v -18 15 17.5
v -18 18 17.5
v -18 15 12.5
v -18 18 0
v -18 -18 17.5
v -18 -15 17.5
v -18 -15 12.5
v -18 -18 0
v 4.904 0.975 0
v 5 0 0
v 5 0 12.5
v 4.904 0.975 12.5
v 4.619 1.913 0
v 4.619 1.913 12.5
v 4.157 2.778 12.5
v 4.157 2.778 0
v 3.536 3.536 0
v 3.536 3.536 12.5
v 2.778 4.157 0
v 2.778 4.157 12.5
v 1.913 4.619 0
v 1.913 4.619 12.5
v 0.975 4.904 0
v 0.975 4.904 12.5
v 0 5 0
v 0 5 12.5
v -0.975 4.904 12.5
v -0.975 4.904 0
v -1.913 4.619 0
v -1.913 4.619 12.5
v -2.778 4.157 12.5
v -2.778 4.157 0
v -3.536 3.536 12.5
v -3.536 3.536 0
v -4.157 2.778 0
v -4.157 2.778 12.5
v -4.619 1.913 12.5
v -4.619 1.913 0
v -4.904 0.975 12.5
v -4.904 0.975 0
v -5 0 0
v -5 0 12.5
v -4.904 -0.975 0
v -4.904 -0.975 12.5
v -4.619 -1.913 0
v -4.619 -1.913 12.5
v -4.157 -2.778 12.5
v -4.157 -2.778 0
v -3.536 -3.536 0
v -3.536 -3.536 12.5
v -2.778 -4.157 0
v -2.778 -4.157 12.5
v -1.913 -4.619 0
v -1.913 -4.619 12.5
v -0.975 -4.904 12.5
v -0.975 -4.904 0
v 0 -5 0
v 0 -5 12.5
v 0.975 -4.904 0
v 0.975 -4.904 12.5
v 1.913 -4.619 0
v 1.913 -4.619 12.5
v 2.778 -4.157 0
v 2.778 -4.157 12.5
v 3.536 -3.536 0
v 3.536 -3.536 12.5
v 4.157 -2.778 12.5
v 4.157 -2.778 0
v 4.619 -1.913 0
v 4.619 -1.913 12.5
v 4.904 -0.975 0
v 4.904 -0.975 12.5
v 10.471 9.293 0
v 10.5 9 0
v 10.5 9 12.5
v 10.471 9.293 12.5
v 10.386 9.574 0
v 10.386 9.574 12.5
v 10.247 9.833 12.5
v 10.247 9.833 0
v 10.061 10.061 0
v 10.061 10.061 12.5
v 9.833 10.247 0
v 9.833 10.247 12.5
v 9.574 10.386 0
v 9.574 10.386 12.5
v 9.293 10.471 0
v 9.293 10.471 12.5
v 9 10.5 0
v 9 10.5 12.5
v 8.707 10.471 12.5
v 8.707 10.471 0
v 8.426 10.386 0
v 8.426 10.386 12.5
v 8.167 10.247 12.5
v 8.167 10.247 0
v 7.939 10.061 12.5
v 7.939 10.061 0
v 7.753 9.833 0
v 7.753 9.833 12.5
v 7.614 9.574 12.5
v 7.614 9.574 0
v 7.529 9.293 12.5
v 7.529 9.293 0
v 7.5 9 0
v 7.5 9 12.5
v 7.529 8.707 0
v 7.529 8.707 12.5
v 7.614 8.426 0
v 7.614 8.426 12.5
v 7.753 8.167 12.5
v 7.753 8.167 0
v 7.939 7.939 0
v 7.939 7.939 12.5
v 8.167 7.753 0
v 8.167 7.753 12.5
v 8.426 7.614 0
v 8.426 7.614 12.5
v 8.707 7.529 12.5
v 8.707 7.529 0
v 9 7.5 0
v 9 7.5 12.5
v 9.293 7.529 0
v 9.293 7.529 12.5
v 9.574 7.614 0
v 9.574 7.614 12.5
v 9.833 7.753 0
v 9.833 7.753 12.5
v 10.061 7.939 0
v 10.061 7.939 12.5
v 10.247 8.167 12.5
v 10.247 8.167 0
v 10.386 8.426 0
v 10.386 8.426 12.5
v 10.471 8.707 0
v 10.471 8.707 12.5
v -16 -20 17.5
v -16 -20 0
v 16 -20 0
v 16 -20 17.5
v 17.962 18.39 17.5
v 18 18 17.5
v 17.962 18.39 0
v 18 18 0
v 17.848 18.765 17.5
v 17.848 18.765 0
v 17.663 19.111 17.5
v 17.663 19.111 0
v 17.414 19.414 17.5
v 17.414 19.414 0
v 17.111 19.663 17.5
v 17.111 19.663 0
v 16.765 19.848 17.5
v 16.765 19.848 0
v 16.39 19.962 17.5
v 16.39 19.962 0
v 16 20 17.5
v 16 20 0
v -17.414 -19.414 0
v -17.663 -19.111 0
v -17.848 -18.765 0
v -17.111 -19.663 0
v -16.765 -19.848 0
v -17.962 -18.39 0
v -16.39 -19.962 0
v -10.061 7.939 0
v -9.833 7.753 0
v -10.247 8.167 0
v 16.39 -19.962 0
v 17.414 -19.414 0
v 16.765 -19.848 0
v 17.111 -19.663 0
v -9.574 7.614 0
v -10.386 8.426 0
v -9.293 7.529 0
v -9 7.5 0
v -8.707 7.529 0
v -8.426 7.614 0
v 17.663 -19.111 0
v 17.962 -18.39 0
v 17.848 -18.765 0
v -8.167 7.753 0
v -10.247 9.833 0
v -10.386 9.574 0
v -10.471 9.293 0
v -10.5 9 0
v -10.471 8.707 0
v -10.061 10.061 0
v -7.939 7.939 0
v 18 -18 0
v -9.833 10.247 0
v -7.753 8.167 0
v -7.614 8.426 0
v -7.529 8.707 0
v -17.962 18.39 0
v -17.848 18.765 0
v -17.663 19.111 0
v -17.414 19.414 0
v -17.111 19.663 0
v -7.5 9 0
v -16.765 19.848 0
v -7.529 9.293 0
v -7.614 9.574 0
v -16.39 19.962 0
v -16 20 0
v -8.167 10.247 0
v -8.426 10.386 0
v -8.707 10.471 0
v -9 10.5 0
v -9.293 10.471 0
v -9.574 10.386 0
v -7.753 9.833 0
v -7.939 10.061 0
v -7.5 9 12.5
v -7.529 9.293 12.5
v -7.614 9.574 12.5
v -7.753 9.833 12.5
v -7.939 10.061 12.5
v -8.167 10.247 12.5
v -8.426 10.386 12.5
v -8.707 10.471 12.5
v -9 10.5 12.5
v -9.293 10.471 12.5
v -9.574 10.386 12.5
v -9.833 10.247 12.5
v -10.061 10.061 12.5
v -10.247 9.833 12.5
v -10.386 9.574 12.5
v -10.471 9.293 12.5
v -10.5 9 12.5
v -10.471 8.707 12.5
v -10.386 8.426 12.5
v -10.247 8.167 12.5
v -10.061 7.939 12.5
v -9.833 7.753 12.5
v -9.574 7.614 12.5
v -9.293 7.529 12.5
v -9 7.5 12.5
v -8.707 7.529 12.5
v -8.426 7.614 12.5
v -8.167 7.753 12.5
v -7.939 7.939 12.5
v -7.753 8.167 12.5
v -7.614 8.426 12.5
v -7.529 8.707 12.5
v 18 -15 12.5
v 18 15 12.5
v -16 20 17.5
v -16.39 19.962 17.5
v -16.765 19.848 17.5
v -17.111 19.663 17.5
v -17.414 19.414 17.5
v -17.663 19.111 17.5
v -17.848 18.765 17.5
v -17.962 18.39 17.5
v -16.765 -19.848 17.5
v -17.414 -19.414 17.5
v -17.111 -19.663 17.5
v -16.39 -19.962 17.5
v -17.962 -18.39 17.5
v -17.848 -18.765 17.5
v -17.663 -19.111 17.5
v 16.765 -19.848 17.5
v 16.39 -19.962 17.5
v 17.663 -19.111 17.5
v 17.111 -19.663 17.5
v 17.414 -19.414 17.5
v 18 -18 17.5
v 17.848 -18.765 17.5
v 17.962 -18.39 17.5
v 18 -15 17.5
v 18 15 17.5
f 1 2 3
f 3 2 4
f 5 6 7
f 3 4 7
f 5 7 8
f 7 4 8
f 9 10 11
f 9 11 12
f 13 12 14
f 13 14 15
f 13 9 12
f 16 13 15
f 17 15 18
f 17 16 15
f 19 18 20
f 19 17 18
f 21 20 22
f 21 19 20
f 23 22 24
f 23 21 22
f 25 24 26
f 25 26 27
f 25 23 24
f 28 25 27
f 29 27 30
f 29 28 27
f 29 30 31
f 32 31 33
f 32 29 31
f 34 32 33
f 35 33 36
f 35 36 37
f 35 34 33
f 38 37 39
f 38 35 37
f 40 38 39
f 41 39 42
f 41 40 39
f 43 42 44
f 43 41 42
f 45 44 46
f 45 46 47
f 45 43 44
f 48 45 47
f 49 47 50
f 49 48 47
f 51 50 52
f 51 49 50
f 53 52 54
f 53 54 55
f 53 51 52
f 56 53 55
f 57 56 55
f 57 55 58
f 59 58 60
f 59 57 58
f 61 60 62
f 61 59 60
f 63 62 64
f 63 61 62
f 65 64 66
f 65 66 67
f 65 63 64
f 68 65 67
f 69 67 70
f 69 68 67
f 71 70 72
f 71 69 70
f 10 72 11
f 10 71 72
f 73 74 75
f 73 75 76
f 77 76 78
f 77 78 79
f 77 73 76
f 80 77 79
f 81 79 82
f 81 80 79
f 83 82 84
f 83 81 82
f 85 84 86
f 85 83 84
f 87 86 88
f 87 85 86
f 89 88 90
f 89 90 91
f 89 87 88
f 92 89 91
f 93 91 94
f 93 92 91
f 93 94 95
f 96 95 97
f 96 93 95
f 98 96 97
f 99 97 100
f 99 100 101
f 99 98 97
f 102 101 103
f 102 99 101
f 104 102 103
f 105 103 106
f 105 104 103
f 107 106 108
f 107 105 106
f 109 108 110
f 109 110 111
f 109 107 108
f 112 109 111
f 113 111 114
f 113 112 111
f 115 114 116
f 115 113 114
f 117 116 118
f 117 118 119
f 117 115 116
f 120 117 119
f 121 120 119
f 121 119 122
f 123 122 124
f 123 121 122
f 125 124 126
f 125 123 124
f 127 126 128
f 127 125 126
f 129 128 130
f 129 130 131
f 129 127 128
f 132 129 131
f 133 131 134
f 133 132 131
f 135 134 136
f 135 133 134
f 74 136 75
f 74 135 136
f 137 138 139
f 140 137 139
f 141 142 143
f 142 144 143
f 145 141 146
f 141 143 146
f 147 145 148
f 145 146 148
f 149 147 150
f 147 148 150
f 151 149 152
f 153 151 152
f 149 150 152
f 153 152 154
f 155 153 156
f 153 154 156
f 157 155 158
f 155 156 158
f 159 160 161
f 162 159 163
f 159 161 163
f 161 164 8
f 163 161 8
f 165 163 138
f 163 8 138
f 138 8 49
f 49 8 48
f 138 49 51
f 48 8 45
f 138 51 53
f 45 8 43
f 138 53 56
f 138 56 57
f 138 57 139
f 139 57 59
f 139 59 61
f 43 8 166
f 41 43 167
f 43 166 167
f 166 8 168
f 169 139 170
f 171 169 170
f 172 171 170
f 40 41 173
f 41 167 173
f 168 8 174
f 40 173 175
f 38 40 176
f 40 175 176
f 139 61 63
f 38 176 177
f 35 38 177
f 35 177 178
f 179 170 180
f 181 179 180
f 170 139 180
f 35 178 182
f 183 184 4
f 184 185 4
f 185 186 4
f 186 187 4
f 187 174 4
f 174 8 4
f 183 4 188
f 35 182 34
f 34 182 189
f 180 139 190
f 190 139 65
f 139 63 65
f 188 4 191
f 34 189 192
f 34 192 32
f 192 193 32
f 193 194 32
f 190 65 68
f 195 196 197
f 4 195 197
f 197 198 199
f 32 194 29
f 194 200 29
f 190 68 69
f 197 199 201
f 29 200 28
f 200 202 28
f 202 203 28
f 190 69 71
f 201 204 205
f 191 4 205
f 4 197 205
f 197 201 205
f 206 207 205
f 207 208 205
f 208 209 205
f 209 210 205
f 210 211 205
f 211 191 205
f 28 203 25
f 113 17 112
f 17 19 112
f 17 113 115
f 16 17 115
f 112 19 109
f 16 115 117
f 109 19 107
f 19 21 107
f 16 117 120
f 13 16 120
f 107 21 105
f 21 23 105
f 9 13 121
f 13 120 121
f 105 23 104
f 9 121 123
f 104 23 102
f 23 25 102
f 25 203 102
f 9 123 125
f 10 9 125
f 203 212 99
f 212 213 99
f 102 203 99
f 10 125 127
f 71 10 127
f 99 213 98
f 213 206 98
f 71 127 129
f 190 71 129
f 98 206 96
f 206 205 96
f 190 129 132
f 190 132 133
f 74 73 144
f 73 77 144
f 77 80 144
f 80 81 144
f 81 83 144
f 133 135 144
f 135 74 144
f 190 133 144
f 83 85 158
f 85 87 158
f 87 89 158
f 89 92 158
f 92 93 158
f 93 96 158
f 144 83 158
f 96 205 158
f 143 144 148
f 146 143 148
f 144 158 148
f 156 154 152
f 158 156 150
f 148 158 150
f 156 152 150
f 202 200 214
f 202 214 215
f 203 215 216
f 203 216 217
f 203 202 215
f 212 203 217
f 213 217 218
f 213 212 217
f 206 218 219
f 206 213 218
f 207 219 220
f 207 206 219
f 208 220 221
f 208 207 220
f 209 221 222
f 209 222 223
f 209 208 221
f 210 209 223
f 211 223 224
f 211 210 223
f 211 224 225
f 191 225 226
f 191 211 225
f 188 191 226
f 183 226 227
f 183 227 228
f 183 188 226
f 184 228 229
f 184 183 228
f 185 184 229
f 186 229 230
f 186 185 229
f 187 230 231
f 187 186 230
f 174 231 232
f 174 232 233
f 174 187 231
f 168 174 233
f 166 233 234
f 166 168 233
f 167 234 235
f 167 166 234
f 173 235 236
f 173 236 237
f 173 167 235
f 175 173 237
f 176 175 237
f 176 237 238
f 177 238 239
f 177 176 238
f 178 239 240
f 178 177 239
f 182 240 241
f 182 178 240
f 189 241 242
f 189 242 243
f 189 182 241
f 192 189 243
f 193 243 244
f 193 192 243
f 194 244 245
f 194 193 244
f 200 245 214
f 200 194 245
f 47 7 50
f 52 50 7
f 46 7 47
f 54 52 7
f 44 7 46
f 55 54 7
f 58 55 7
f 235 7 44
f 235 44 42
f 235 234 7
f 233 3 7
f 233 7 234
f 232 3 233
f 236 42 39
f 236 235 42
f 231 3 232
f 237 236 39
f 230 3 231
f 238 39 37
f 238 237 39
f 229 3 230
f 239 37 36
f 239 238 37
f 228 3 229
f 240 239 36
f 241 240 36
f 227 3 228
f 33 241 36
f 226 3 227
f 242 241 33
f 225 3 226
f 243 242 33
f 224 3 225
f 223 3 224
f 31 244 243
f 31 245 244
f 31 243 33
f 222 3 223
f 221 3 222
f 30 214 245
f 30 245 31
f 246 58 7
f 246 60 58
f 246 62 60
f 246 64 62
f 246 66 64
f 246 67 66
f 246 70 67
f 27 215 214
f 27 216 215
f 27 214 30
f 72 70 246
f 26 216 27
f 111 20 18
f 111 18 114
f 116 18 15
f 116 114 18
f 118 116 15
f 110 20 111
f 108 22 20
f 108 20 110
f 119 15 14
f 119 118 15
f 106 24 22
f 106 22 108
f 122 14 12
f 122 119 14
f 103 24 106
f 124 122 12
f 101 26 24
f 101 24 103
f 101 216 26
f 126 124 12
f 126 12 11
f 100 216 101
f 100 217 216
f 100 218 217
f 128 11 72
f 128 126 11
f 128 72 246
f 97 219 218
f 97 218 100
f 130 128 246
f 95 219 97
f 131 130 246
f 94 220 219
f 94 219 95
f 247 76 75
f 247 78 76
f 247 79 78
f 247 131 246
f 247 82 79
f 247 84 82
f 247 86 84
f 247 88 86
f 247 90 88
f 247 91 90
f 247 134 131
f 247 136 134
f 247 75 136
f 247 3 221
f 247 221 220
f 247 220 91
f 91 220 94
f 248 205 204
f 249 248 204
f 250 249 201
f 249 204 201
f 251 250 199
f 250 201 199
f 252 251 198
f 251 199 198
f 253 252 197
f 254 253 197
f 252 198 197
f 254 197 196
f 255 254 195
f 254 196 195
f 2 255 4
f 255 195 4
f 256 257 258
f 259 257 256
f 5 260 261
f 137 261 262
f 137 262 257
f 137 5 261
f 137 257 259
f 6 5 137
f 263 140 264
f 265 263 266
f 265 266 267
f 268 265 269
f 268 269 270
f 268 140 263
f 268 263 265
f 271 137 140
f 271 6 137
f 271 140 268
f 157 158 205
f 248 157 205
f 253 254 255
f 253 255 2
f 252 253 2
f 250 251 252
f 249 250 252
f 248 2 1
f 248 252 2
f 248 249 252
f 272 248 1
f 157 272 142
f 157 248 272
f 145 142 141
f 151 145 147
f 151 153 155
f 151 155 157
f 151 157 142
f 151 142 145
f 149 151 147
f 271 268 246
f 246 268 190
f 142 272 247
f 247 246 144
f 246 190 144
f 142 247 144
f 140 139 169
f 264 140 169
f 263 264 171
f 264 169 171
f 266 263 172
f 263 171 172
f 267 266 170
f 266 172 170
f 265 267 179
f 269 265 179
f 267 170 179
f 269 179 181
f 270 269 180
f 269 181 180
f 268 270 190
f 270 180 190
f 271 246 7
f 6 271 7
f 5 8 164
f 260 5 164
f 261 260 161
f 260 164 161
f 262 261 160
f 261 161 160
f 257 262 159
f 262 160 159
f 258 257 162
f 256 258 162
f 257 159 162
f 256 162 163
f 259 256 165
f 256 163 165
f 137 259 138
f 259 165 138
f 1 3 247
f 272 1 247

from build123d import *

# Parameters (mm, degrees)
F0_R     = 1.5
F0_R_2   = 5
F1_DEPTH = 12.5
F3_DEPTH = 5


with BuildPart() as f1:
    # F0 (on Top) → F1 (new body)
    with BuildSketch(Plane.XY):
        with BuildLine():
            ThreePointArc((18, 18), (17.414214, 19.414214), (16, 20))
            Line((16, 20), (-16, 20))
            ThreePointArc((-16, 20), (-17.414214, 19.414214), (-18, 18))
            Line((-18, 18), (-18, -18))
            ThreePointArc((-18, -18), (-17.414214, -19.414214), (-16, -20))
            Line((-16, -20), (16, -20))
            ThreePointArc((16, -20), (17.414214, -19.414214), (18, -18))
            Line((18, -18), (18, 18))
        make_face()
        with Locations((-9, 9)):
            Circle(F0_R, mode=Mode.SUBTRACT)
        Circle(F0_R_2, mode=Mode.SUBTRACT)
        with Locations((9, 9)):
            Circle(F0_R, mode=Mode.SUBTRACT)
    extrude(amount=F1_DEPTH)

    # F2 (on face) → F3 (join)
    with BuildSketch(Plane.XY.offset(12.5)):
        with BuildLine():
            Line((-18, 18), (-18, 15))
            Line((-18, 15), (18, 15))
            Line((18, 15), (18, 18))
            ThreePointArc((18, 18), (17.414214, 19.414214), (16, 20))
            Line((16, 20), (-16, 20))
            ThreePointArc((-16, 20), (-17.414214, 19.414214), (-18, 18))
        make_face()
        with BuildLine():
            Line((18, -15), (-18, -15))
            Line((-18, -15), (-18, -18))
            ThreePointArc((-18, -18), (-17.414214, -19.414214), (-16, -20))
            Line((-16, -20), (16, -20))
            ThreePointArc((16, -20), (17.414214, -19.414214), (18, -18))
            Line((18, -18), (18, -15))
        make_face()
    extrude(amount=F3_DEPTH)


solid = f1.part
